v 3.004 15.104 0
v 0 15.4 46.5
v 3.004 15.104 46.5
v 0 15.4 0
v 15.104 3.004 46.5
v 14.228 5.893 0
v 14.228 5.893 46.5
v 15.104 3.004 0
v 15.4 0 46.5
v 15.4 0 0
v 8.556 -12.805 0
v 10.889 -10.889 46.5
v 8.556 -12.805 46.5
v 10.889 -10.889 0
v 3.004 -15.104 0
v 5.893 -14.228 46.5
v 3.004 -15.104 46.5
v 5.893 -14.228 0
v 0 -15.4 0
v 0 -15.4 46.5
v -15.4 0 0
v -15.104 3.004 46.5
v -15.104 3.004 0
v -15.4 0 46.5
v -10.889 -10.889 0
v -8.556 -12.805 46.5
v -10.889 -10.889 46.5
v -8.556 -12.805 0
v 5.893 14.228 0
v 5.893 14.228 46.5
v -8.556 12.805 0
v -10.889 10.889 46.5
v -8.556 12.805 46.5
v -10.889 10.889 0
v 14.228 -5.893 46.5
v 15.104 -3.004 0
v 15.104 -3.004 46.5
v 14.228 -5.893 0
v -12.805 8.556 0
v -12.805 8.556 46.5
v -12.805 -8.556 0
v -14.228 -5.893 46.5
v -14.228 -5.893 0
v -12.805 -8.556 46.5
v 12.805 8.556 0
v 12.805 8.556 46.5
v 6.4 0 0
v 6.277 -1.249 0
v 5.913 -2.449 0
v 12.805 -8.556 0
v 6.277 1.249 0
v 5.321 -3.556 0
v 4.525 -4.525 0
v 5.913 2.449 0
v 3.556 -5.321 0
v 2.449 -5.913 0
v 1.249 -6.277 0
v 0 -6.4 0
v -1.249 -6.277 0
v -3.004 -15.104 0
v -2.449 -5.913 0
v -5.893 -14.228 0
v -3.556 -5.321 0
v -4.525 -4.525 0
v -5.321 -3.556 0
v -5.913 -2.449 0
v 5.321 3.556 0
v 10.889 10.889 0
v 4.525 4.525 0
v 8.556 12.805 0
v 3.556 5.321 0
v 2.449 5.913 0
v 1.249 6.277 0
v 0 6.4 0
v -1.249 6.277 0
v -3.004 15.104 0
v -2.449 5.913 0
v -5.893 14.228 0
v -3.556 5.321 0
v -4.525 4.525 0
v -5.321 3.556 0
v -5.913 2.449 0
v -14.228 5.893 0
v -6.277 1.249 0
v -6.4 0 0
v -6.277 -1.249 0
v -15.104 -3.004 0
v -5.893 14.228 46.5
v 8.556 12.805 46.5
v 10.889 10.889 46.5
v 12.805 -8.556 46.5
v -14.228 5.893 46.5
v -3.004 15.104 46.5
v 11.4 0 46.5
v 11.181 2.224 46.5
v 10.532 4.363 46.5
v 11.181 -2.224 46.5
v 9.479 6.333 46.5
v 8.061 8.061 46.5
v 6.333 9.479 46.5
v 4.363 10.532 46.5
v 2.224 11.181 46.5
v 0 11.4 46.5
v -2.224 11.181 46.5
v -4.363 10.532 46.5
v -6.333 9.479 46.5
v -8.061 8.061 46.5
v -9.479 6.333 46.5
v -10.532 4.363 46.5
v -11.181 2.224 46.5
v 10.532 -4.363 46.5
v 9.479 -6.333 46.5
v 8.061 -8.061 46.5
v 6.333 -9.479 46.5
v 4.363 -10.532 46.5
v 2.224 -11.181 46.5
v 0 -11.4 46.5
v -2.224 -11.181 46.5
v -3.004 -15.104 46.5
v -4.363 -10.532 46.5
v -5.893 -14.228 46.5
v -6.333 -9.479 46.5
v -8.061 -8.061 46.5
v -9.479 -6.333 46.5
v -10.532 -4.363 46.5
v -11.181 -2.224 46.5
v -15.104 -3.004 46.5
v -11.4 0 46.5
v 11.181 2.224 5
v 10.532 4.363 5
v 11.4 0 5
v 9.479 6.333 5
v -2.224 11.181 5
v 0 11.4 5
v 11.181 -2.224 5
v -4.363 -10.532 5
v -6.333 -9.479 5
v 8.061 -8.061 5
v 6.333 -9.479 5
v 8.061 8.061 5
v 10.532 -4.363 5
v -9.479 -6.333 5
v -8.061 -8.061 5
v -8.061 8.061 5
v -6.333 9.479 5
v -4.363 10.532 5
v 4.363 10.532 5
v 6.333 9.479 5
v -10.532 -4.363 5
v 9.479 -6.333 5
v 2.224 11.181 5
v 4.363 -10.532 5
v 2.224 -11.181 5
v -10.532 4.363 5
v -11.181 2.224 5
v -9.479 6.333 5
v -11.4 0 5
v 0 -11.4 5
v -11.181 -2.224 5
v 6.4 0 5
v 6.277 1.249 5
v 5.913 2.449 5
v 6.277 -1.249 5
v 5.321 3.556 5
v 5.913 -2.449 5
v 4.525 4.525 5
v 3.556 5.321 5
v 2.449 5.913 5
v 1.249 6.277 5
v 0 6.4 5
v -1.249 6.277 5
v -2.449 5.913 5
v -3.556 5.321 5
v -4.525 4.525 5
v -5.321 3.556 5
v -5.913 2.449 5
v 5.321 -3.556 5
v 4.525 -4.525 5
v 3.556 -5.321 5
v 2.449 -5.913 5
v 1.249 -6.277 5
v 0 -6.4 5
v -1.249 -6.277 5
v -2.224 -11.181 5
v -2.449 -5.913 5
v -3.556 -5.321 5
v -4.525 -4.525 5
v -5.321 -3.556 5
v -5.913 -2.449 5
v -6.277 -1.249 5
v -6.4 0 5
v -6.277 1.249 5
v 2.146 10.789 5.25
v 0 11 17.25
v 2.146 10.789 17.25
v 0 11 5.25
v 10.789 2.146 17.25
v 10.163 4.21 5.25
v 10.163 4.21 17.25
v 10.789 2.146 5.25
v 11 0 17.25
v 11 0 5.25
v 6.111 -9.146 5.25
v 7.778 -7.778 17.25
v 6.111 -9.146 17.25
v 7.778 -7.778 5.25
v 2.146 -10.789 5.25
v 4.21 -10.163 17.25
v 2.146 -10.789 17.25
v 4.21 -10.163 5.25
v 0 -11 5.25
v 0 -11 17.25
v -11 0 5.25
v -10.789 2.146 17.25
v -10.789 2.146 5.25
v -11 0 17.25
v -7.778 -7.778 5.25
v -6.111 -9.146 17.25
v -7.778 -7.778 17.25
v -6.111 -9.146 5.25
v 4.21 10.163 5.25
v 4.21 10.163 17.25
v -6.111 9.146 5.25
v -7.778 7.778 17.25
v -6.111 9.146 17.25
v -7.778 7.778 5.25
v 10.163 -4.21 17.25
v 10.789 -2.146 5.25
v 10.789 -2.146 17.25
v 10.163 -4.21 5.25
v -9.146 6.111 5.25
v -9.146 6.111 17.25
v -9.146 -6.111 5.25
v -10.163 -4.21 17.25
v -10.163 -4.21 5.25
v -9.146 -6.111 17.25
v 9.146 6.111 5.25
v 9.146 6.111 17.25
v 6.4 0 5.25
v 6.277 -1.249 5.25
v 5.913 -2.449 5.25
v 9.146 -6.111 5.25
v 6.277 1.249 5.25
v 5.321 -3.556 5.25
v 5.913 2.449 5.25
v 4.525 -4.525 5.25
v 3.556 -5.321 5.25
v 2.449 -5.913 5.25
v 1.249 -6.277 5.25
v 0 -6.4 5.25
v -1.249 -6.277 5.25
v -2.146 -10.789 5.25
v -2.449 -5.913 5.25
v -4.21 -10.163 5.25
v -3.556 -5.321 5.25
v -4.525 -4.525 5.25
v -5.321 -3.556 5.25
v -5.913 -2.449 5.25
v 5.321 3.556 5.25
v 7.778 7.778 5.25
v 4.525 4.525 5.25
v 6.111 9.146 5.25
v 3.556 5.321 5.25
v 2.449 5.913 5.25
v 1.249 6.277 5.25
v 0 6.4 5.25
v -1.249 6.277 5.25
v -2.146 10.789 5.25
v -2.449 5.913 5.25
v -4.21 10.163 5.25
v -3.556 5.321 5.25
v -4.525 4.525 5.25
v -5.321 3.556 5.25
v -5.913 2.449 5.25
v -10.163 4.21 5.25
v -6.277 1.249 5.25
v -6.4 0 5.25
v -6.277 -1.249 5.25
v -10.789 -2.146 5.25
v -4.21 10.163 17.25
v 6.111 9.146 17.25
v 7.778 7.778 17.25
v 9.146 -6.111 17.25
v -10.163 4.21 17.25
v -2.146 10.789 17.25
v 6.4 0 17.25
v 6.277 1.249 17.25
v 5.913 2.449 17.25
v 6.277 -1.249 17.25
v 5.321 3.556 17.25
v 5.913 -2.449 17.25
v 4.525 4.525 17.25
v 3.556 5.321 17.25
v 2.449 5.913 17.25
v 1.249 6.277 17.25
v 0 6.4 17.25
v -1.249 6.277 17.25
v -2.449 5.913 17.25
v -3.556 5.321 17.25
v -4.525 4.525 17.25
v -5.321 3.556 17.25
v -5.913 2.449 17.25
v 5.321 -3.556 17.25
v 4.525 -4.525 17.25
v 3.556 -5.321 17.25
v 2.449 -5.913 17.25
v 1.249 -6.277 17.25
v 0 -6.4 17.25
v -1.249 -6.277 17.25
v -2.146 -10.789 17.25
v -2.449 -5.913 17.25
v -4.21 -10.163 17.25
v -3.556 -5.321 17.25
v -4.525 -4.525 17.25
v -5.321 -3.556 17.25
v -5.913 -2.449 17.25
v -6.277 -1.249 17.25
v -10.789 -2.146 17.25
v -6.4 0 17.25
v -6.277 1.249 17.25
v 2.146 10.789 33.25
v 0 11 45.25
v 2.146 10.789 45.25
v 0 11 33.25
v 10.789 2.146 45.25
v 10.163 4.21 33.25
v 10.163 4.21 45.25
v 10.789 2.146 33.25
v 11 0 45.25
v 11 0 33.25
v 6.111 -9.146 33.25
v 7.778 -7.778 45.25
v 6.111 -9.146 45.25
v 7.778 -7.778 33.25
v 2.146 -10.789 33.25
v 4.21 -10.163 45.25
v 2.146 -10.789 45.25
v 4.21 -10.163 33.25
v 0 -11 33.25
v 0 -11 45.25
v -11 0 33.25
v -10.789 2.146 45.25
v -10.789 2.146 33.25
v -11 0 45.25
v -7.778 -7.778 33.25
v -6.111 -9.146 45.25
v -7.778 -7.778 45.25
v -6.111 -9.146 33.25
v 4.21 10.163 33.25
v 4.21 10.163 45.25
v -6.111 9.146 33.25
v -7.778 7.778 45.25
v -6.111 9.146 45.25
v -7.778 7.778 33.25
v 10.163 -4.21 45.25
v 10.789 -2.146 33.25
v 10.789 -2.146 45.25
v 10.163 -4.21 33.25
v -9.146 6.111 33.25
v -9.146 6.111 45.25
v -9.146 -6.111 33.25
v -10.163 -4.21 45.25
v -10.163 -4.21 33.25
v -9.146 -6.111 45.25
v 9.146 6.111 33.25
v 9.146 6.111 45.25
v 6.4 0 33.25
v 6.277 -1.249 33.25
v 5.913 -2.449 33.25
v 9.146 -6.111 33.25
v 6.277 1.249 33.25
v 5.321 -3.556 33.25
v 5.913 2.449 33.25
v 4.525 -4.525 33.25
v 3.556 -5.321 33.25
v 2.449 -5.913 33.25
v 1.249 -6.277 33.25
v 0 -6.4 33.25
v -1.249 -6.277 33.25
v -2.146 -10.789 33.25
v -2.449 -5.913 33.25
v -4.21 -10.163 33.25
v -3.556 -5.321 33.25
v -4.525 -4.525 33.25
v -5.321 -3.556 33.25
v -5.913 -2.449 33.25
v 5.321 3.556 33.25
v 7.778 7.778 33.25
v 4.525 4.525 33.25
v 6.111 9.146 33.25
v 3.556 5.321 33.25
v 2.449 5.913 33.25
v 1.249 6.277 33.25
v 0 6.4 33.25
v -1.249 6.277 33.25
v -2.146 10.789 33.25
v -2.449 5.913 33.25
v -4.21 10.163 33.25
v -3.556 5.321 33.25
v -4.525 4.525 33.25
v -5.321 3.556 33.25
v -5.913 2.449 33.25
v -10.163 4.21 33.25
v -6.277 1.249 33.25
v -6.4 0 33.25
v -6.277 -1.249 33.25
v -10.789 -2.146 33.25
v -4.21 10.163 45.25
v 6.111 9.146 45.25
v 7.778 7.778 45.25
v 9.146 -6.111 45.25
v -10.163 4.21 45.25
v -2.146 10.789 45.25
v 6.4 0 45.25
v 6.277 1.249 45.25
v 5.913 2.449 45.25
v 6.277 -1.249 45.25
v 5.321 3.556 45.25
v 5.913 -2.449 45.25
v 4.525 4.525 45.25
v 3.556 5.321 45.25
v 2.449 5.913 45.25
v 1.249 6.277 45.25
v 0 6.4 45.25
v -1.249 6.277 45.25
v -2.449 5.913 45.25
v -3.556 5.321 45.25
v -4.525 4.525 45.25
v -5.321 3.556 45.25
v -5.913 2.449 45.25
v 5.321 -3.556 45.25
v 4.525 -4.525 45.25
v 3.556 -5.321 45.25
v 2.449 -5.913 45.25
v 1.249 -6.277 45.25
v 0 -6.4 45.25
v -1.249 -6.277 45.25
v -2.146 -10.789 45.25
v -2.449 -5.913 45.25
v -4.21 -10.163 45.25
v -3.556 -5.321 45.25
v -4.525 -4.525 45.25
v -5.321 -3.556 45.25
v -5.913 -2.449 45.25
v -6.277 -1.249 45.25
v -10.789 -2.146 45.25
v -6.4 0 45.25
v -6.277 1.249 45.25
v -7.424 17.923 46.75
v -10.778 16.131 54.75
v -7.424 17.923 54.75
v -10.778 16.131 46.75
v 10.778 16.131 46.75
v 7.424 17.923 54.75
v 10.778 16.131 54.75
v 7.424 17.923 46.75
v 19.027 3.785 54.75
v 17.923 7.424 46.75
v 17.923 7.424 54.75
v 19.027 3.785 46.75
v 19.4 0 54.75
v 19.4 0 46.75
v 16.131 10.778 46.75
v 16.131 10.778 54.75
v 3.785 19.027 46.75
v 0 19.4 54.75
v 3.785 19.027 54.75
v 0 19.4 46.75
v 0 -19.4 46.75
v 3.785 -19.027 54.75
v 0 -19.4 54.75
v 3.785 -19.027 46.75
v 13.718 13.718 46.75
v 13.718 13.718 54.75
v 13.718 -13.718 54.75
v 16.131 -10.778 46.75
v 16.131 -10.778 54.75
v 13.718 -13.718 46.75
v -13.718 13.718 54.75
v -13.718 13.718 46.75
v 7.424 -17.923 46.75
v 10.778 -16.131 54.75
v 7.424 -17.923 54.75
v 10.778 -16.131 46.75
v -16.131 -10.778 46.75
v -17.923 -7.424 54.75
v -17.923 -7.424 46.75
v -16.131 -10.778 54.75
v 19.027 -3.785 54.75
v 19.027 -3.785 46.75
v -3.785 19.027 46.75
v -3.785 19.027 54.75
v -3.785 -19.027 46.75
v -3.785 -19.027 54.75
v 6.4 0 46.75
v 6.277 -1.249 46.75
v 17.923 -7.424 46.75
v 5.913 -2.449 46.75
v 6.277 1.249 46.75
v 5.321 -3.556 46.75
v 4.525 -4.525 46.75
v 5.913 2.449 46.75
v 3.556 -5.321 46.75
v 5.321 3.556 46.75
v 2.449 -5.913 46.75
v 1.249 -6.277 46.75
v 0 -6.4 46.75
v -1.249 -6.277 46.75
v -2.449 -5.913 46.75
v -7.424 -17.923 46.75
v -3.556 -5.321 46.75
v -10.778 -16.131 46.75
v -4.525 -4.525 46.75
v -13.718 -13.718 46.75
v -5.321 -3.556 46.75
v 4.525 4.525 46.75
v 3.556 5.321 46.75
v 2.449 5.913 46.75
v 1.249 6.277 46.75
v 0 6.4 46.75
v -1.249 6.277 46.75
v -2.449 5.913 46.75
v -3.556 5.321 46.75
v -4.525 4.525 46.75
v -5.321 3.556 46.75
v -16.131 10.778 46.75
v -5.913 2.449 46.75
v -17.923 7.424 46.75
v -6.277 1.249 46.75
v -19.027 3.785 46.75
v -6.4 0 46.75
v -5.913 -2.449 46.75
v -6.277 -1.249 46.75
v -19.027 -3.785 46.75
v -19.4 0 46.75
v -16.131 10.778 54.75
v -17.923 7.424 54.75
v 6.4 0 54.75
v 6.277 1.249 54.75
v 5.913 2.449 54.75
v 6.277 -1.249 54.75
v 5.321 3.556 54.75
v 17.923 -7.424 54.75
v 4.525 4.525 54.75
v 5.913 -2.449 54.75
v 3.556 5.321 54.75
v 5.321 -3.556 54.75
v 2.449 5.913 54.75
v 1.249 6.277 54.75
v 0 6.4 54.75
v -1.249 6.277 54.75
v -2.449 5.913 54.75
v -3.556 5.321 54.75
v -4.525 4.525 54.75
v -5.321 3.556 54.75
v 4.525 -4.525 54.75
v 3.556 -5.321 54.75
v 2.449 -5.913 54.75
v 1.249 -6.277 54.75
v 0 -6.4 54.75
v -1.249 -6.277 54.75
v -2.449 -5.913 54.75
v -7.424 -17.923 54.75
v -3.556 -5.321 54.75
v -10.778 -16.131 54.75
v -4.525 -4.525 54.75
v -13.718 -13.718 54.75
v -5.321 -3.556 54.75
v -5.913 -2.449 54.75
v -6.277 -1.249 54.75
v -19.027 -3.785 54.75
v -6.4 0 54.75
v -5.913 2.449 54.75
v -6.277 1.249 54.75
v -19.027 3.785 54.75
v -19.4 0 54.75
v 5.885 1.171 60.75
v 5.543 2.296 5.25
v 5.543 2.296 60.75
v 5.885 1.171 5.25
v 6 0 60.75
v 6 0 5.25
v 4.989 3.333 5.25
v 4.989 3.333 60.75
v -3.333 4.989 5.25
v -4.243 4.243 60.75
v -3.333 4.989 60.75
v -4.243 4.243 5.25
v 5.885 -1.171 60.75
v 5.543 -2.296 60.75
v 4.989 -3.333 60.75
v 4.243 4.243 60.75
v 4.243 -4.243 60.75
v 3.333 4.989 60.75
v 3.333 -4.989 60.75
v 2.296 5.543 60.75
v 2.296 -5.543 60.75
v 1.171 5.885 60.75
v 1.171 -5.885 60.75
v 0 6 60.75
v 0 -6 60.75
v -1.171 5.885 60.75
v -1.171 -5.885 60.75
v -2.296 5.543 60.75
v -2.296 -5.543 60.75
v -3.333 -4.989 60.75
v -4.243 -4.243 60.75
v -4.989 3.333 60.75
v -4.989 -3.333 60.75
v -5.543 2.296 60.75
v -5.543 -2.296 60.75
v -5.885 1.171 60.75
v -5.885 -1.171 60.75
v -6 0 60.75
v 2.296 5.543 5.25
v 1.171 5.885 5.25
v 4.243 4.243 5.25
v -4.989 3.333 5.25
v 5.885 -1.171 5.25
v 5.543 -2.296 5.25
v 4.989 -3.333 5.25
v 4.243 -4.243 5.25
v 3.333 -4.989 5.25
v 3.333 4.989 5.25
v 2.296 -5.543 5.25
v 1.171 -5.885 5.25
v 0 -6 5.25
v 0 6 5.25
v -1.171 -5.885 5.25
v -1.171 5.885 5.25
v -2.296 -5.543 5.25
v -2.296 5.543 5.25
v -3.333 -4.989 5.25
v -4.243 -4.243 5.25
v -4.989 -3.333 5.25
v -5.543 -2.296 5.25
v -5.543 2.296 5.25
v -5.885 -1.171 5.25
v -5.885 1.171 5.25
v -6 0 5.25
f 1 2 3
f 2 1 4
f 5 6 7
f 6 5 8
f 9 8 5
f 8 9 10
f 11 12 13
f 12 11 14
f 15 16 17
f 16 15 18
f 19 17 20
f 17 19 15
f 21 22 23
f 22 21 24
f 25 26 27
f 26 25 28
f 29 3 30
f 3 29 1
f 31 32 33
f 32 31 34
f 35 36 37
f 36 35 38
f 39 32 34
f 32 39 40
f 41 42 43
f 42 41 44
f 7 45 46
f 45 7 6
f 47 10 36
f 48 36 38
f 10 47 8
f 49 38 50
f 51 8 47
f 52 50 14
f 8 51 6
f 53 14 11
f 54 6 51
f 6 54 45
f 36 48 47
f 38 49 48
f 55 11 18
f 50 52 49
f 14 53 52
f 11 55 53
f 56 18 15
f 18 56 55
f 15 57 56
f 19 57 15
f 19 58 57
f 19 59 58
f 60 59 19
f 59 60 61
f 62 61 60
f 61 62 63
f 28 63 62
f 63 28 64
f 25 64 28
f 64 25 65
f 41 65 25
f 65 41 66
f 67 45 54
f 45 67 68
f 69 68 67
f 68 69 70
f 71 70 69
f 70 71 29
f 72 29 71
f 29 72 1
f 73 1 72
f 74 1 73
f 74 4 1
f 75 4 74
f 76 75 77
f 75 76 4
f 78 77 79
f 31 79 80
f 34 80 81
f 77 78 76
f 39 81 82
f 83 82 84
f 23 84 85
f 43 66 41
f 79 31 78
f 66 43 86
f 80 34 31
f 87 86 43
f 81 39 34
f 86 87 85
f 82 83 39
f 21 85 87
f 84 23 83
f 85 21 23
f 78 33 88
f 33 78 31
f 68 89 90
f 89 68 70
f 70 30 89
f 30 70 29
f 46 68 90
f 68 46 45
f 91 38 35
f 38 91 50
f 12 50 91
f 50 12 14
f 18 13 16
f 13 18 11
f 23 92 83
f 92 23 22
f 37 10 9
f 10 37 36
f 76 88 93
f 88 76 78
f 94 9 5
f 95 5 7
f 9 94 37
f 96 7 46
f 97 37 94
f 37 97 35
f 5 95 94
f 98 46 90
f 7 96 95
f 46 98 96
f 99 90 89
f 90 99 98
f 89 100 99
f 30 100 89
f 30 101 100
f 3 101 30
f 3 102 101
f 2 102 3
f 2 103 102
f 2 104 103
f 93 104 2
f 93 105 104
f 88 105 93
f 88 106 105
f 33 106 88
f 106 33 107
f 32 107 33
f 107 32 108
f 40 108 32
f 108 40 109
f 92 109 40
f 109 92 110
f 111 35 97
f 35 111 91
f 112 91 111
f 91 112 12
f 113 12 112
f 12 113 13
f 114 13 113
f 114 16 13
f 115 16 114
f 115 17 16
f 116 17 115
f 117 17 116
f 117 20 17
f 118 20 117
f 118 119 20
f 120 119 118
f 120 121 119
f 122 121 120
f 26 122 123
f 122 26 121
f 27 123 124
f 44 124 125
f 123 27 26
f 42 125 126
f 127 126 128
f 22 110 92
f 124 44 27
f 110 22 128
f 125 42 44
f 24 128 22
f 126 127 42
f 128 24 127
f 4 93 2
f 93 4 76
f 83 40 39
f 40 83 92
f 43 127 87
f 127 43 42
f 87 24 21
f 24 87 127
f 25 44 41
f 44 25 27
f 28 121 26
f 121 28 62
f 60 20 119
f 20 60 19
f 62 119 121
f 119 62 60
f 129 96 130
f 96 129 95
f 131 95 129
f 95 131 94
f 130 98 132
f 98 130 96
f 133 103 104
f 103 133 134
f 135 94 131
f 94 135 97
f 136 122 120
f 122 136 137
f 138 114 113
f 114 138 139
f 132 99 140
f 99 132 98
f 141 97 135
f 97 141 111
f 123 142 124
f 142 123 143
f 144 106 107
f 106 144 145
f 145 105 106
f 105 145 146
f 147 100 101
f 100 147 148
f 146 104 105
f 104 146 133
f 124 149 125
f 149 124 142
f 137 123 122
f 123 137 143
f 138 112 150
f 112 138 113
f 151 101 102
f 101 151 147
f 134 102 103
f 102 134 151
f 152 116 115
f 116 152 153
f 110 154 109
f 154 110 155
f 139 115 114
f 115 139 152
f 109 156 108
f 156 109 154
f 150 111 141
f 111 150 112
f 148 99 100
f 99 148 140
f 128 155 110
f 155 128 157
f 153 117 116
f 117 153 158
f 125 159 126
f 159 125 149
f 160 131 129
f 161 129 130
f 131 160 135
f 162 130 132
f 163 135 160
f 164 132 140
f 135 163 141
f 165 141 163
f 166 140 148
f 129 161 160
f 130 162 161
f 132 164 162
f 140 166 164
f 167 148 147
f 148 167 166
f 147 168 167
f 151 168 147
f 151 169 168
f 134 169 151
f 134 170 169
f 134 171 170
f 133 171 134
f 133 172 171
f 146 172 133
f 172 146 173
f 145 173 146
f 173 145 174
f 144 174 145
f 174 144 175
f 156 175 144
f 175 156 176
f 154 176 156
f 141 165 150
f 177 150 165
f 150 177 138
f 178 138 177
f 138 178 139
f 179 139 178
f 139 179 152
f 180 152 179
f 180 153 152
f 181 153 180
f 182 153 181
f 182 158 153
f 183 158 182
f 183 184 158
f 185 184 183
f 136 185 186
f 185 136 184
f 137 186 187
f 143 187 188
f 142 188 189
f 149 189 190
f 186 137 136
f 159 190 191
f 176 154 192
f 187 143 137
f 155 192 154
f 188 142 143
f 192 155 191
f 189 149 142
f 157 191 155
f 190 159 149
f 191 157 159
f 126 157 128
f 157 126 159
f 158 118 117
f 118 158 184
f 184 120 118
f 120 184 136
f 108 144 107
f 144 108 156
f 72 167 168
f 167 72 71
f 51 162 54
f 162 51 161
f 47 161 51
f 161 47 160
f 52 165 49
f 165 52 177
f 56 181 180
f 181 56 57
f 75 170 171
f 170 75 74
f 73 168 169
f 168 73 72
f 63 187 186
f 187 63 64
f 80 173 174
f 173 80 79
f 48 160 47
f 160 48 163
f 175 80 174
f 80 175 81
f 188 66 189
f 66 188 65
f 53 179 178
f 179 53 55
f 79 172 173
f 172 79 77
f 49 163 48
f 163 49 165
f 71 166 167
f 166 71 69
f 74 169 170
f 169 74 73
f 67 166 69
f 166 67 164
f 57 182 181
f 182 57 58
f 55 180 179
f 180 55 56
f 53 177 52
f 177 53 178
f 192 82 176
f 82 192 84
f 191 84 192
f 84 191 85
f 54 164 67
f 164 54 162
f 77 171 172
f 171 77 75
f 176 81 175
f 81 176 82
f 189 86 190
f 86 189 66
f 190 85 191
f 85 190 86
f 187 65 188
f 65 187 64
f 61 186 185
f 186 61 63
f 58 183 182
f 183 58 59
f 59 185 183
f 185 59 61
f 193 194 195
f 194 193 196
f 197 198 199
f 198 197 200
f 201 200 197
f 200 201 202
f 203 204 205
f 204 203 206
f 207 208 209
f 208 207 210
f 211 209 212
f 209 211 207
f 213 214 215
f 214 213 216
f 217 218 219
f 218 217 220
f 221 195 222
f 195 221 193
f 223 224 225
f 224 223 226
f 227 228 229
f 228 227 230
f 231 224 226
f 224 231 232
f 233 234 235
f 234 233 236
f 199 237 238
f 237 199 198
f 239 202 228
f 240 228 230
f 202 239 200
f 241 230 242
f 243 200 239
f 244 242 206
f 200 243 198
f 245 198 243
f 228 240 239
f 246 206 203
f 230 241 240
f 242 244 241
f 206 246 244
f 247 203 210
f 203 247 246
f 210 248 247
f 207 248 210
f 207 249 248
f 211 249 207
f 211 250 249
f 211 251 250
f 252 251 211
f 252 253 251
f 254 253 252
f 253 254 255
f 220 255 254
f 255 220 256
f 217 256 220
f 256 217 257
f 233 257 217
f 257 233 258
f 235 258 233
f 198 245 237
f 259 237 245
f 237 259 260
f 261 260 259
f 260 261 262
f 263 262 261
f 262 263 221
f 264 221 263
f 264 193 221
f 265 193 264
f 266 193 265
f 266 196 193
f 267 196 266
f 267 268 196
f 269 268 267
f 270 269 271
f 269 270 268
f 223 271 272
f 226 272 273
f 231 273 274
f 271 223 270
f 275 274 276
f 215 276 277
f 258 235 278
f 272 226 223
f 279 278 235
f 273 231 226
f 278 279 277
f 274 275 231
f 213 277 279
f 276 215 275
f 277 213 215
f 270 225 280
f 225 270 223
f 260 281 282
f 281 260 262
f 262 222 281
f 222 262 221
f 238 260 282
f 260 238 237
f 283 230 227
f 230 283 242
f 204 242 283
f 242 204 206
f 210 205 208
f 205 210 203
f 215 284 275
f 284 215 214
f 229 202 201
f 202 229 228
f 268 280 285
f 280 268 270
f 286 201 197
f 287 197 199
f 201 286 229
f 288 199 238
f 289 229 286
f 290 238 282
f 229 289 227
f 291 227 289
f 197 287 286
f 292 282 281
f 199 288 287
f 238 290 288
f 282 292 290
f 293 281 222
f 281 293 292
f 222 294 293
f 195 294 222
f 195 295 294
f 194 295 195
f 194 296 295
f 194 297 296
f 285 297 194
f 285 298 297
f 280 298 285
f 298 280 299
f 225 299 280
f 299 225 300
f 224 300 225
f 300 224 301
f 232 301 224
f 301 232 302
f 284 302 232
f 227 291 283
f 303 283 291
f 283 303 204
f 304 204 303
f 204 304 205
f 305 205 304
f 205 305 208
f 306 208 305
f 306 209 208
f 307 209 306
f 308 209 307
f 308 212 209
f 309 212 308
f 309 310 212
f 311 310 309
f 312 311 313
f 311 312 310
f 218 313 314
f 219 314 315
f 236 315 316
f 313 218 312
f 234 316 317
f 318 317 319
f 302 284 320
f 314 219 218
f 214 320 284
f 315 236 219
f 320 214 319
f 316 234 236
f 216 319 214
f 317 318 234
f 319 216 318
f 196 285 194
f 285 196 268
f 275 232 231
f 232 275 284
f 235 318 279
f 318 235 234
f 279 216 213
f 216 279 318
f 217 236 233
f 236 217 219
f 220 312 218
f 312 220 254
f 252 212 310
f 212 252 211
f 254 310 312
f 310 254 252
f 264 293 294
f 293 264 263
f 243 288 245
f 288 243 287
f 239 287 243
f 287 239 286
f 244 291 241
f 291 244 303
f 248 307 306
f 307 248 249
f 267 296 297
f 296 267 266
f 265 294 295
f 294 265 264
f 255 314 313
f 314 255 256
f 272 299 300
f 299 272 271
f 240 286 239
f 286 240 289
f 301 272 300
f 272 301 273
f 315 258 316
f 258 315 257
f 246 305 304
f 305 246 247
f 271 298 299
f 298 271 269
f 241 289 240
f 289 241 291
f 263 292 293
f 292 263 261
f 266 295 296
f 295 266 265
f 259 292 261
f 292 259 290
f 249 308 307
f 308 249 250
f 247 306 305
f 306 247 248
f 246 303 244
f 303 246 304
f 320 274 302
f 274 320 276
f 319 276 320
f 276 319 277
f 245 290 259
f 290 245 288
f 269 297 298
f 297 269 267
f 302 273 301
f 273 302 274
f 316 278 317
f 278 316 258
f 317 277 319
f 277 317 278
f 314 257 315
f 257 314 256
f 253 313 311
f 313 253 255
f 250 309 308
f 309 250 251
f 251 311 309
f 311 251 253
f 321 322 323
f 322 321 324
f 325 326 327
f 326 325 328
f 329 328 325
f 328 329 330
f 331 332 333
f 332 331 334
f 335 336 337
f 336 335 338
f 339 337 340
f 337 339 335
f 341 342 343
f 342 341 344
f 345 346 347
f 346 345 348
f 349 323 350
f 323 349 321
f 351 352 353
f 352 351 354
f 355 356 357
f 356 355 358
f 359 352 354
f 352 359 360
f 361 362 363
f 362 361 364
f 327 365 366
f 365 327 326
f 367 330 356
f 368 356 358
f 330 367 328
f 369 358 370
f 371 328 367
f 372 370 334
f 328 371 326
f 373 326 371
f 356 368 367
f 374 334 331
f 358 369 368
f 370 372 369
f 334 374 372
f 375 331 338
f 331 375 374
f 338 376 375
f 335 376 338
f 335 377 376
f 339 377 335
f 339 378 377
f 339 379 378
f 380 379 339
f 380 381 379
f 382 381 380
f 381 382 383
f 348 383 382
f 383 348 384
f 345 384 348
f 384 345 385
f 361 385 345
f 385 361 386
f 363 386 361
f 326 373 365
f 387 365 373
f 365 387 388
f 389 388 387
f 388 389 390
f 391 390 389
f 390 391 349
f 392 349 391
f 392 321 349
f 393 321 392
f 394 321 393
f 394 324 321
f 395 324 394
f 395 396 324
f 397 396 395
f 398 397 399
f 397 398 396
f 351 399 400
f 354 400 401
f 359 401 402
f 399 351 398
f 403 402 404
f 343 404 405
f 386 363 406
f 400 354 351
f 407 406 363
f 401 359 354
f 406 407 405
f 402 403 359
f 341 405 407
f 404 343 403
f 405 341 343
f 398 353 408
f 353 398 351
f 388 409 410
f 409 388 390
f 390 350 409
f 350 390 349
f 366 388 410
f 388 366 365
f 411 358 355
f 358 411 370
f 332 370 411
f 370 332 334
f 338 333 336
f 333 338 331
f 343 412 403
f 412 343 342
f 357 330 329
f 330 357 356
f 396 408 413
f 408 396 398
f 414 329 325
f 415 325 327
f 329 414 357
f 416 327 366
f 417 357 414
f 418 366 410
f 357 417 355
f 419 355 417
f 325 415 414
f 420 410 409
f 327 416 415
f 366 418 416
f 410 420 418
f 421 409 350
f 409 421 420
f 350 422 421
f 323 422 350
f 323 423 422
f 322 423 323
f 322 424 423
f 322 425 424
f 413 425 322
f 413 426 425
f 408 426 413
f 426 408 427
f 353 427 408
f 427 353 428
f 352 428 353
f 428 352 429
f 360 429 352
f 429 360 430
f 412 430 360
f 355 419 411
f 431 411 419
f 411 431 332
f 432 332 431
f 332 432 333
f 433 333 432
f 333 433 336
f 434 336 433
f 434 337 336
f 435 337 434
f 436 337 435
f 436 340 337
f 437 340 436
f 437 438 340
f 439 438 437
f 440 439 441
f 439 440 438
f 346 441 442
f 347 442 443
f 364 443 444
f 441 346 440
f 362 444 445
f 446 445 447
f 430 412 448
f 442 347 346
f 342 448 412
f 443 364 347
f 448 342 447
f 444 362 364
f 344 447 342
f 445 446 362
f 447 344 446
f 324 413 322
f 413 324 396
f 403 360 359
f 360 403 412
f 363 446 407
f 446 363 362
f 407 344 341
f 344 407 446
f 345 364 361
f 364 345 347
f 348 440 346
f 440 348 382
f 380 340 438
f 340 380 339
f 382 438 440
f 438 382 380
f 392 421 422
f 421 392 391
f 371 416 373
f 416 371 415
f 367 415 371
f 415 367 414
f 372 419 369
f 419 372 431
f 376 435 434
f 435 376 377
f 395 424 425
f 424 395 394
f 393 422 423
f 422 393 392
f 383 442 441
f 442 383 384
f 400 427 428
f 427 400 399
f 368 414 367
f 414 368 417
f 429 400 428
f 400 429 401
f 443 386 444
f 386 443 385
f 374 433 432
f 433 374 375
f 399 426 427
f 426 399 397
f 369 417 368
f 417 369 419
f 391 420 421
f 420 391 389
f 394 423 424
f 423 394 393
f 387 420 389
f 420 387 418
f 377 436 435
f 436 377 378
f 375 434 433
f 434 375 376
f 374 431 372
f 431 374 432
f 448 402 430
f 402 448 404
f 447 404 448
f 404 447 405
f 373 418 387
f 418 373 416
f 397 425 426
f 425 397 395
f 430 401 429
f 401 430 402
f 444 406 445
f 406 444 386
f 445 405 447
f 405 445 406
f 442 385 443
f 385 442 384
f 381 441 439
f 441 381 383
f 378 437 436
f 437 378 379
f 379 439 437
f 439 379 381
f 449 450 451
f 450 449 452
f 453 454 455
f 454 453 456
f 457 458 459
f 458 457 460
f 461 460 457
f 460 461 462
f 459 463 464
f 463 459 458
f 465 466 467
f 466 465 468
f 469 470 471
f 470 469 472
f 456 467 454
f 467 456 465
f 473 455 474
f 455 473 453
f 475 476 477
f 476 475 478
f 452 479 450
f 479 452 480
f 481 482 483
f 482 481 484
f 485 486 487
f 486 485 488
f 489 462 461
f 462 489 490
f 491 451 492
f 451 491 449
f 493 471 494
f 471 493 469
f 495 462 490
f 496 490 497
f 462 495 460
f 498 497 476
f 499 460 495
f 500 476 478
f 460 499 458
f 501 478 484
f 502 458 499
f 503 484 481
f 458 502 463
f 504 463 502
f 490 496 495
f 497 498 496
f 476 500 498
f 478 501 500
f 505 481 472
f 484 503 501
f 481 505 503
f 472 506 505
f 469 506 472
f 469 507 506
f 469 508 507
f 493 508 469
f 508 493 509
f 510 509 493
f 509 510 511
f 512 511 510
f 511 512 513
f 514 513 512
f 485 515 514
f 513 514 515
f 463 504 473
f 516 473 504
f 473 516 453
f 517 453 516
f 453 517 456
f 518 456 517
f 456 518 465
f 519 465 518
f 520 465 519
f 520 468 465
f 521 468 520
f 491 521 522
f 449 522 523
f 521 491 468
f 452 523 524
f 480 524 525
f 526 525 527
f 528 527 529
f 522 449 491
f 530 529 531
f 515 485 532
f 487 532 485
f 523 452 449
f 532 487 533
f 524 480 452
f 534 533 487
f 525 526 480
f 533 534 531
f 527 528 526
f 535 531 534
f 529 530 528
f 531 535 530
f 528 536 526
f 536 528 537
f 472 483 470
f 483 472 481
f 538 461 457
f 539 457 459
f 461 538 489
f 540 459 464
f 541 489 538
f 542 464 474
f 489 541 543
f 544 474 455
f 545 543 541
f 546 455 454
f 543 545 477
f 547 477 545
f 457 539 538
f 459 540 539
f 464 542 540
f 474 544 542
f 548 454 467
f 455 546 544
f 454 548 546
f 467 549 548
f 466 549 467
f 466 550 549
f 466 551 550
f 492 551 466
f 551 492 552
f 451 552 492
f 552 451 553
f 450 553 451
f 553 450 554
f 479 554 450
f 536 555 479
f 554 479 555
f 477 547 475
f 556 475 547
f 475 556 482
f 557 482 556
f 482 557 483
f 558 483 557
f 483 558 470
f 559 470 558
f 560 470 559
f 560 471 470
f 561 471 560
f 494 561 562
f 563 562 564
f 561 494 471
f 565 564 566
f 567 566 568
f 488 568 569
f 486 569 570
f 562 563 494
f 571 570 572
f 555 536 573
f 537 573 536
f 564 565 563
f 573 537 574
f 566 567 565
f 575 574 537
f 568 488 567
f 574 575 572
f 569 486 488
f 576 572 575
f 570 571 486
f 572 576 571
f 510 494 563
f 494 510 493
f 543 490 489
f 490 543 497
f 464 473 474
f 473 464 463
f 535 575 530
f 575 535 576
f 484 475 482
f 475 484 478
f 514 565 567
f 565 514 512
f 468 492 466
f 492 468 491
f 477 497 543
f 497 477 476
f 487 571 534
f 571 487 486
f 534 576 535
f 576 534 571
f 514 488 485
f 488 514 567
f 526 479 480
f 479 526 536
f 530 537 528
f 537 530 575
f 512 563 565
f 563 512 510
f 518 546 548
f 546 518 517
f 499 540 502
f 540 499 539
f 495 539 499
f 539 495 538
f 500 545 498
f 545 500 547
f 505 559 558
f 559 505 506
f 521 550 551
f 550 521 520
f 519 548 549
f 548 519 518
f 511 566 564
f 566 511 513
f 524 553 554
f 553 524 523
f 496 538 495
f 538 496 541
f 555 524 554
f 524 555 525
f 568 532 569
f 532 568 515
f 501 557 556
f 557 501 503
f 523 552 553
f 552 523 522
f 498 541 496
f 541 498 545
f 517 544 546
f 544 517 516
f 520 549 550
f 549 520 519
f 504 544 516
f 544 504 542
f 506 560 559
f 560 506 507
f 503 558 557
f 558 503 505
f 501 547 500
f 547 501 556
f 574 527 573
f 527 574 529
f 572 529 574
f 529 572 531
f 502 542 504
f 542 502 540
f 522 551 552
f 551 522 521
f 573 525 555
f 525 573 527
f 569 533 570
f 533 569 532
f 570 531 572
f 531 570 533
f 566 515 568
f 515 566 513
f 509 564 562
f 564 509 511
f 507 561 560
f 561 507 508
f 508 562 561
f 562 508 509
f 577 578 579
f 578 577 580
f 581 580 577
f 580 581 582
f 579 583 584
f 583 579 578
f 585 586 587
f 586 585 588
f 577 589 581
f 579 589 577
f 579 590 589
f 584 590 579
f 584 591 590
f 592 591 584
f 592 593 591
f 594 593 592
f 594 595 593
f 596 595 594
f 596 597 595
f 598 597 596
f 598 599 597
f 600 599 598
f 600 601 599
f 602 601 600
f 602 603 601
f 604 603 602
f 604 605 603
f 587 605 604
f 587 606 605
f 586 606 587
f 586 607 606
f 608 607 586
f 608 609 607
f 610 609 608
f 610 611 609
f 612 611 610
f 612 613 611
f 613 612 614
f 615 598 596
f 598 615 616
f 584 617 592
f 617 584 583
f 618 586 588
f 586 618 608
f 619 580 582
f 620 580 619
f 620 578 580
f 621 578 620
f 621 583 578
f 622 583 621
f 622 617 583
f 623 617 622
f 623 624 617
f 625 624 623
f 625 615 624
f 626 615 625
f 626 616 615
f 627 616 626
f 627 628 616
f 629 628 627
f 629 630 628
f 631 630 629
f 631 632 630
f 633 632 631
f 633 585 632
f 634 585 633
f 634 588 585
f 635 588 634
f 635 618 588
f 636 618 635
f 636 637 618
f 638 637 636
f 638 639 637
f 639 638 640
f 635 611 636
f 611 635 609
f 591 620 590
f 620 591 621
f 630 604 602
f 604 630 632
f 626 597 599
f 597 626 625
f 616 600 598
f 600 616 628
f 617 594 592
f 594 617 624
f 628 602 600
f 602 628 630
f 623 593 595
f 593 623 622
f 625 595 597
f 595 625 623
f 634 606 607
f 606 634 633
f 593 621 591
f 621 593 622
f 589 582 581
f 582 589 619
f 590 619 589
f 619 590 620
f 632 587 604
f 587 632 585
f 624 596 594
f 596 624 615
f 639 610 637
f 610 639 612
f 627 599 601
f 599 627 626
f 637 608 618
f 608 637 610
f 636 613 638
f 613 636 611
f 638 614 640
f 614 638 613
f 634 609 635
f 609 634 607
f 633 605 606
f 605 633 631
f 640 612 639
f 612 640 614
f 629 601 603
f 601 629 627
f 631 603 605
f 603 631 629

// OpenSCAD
$fn = 32;

// ------------------------------------------------------------------------
// Shaft station: cup d30.8 x 46.5 mm, shaft d12
// Every part is its own module, assembly() places every instance.
// ------------------------------------------------------------------------

// --- part 1 ---
module housing_cup() {
  difference() {
    cylinder(h = 46.5, d = 30.8);
    translate([0, 0, 5]) cylinder(h = 42.5, d = 22.8);
    translate([0, 0, -1]) cylinder(h = 7, d = 12.8);
  }
}

// --- part 2 ---
module bearing_lower() {
  difference() {
      translate([0, 0, 0]) cylinder(h = 12, d = 22);
      translate([0, 0, -1]) cylinder(h = 14, d = 12.8);
    }
}

// --- part 3 ---
module bearing_upper() {
  difference() {
      translate([0, 0, 0]) cylinder(h = 12, d = 22);
      translate([0, 0, -1]) cylinder(h = 14, d = 12.8);
    }
}

// --- part 4 ---
module station_shaft() {
  translate([0, 0, -27.75]) cylinder(h = 55.5, d = 12);
}

// --- part 5 ---
module station_cover() {
  difference() {
    cylinder(h = 8, d = 38.8);
    translate([0, 0, -1]) cylinder(h = 10, d = 12.8);
  }
}

// --- assembly ---
module assembly() {
  color([0.80, 0.24, 0.20]) translate([0, 0, 0]) rotate([0, 0, 0]) housing_cup();
  color([0.20, 0.45, 0.75]) translate([0, 0, 5.25]) rotate([0, 0, 0]) bearing_lower();
  color([0.25, 0.62, 0.32]) translate([0, 0, 33.25]) rotate([0, 0, 0]) bearing_upper();
  color([0.92, 0.70, 0.18]) translate([0, 0, 33]) rotate([0, 0, 0]) station_shaft();
  color([0.58, 0.35, 0.70]) translate([0, 0, 46.75]) rotate([0, 0, 0]) station_cover();
}

assembly();
